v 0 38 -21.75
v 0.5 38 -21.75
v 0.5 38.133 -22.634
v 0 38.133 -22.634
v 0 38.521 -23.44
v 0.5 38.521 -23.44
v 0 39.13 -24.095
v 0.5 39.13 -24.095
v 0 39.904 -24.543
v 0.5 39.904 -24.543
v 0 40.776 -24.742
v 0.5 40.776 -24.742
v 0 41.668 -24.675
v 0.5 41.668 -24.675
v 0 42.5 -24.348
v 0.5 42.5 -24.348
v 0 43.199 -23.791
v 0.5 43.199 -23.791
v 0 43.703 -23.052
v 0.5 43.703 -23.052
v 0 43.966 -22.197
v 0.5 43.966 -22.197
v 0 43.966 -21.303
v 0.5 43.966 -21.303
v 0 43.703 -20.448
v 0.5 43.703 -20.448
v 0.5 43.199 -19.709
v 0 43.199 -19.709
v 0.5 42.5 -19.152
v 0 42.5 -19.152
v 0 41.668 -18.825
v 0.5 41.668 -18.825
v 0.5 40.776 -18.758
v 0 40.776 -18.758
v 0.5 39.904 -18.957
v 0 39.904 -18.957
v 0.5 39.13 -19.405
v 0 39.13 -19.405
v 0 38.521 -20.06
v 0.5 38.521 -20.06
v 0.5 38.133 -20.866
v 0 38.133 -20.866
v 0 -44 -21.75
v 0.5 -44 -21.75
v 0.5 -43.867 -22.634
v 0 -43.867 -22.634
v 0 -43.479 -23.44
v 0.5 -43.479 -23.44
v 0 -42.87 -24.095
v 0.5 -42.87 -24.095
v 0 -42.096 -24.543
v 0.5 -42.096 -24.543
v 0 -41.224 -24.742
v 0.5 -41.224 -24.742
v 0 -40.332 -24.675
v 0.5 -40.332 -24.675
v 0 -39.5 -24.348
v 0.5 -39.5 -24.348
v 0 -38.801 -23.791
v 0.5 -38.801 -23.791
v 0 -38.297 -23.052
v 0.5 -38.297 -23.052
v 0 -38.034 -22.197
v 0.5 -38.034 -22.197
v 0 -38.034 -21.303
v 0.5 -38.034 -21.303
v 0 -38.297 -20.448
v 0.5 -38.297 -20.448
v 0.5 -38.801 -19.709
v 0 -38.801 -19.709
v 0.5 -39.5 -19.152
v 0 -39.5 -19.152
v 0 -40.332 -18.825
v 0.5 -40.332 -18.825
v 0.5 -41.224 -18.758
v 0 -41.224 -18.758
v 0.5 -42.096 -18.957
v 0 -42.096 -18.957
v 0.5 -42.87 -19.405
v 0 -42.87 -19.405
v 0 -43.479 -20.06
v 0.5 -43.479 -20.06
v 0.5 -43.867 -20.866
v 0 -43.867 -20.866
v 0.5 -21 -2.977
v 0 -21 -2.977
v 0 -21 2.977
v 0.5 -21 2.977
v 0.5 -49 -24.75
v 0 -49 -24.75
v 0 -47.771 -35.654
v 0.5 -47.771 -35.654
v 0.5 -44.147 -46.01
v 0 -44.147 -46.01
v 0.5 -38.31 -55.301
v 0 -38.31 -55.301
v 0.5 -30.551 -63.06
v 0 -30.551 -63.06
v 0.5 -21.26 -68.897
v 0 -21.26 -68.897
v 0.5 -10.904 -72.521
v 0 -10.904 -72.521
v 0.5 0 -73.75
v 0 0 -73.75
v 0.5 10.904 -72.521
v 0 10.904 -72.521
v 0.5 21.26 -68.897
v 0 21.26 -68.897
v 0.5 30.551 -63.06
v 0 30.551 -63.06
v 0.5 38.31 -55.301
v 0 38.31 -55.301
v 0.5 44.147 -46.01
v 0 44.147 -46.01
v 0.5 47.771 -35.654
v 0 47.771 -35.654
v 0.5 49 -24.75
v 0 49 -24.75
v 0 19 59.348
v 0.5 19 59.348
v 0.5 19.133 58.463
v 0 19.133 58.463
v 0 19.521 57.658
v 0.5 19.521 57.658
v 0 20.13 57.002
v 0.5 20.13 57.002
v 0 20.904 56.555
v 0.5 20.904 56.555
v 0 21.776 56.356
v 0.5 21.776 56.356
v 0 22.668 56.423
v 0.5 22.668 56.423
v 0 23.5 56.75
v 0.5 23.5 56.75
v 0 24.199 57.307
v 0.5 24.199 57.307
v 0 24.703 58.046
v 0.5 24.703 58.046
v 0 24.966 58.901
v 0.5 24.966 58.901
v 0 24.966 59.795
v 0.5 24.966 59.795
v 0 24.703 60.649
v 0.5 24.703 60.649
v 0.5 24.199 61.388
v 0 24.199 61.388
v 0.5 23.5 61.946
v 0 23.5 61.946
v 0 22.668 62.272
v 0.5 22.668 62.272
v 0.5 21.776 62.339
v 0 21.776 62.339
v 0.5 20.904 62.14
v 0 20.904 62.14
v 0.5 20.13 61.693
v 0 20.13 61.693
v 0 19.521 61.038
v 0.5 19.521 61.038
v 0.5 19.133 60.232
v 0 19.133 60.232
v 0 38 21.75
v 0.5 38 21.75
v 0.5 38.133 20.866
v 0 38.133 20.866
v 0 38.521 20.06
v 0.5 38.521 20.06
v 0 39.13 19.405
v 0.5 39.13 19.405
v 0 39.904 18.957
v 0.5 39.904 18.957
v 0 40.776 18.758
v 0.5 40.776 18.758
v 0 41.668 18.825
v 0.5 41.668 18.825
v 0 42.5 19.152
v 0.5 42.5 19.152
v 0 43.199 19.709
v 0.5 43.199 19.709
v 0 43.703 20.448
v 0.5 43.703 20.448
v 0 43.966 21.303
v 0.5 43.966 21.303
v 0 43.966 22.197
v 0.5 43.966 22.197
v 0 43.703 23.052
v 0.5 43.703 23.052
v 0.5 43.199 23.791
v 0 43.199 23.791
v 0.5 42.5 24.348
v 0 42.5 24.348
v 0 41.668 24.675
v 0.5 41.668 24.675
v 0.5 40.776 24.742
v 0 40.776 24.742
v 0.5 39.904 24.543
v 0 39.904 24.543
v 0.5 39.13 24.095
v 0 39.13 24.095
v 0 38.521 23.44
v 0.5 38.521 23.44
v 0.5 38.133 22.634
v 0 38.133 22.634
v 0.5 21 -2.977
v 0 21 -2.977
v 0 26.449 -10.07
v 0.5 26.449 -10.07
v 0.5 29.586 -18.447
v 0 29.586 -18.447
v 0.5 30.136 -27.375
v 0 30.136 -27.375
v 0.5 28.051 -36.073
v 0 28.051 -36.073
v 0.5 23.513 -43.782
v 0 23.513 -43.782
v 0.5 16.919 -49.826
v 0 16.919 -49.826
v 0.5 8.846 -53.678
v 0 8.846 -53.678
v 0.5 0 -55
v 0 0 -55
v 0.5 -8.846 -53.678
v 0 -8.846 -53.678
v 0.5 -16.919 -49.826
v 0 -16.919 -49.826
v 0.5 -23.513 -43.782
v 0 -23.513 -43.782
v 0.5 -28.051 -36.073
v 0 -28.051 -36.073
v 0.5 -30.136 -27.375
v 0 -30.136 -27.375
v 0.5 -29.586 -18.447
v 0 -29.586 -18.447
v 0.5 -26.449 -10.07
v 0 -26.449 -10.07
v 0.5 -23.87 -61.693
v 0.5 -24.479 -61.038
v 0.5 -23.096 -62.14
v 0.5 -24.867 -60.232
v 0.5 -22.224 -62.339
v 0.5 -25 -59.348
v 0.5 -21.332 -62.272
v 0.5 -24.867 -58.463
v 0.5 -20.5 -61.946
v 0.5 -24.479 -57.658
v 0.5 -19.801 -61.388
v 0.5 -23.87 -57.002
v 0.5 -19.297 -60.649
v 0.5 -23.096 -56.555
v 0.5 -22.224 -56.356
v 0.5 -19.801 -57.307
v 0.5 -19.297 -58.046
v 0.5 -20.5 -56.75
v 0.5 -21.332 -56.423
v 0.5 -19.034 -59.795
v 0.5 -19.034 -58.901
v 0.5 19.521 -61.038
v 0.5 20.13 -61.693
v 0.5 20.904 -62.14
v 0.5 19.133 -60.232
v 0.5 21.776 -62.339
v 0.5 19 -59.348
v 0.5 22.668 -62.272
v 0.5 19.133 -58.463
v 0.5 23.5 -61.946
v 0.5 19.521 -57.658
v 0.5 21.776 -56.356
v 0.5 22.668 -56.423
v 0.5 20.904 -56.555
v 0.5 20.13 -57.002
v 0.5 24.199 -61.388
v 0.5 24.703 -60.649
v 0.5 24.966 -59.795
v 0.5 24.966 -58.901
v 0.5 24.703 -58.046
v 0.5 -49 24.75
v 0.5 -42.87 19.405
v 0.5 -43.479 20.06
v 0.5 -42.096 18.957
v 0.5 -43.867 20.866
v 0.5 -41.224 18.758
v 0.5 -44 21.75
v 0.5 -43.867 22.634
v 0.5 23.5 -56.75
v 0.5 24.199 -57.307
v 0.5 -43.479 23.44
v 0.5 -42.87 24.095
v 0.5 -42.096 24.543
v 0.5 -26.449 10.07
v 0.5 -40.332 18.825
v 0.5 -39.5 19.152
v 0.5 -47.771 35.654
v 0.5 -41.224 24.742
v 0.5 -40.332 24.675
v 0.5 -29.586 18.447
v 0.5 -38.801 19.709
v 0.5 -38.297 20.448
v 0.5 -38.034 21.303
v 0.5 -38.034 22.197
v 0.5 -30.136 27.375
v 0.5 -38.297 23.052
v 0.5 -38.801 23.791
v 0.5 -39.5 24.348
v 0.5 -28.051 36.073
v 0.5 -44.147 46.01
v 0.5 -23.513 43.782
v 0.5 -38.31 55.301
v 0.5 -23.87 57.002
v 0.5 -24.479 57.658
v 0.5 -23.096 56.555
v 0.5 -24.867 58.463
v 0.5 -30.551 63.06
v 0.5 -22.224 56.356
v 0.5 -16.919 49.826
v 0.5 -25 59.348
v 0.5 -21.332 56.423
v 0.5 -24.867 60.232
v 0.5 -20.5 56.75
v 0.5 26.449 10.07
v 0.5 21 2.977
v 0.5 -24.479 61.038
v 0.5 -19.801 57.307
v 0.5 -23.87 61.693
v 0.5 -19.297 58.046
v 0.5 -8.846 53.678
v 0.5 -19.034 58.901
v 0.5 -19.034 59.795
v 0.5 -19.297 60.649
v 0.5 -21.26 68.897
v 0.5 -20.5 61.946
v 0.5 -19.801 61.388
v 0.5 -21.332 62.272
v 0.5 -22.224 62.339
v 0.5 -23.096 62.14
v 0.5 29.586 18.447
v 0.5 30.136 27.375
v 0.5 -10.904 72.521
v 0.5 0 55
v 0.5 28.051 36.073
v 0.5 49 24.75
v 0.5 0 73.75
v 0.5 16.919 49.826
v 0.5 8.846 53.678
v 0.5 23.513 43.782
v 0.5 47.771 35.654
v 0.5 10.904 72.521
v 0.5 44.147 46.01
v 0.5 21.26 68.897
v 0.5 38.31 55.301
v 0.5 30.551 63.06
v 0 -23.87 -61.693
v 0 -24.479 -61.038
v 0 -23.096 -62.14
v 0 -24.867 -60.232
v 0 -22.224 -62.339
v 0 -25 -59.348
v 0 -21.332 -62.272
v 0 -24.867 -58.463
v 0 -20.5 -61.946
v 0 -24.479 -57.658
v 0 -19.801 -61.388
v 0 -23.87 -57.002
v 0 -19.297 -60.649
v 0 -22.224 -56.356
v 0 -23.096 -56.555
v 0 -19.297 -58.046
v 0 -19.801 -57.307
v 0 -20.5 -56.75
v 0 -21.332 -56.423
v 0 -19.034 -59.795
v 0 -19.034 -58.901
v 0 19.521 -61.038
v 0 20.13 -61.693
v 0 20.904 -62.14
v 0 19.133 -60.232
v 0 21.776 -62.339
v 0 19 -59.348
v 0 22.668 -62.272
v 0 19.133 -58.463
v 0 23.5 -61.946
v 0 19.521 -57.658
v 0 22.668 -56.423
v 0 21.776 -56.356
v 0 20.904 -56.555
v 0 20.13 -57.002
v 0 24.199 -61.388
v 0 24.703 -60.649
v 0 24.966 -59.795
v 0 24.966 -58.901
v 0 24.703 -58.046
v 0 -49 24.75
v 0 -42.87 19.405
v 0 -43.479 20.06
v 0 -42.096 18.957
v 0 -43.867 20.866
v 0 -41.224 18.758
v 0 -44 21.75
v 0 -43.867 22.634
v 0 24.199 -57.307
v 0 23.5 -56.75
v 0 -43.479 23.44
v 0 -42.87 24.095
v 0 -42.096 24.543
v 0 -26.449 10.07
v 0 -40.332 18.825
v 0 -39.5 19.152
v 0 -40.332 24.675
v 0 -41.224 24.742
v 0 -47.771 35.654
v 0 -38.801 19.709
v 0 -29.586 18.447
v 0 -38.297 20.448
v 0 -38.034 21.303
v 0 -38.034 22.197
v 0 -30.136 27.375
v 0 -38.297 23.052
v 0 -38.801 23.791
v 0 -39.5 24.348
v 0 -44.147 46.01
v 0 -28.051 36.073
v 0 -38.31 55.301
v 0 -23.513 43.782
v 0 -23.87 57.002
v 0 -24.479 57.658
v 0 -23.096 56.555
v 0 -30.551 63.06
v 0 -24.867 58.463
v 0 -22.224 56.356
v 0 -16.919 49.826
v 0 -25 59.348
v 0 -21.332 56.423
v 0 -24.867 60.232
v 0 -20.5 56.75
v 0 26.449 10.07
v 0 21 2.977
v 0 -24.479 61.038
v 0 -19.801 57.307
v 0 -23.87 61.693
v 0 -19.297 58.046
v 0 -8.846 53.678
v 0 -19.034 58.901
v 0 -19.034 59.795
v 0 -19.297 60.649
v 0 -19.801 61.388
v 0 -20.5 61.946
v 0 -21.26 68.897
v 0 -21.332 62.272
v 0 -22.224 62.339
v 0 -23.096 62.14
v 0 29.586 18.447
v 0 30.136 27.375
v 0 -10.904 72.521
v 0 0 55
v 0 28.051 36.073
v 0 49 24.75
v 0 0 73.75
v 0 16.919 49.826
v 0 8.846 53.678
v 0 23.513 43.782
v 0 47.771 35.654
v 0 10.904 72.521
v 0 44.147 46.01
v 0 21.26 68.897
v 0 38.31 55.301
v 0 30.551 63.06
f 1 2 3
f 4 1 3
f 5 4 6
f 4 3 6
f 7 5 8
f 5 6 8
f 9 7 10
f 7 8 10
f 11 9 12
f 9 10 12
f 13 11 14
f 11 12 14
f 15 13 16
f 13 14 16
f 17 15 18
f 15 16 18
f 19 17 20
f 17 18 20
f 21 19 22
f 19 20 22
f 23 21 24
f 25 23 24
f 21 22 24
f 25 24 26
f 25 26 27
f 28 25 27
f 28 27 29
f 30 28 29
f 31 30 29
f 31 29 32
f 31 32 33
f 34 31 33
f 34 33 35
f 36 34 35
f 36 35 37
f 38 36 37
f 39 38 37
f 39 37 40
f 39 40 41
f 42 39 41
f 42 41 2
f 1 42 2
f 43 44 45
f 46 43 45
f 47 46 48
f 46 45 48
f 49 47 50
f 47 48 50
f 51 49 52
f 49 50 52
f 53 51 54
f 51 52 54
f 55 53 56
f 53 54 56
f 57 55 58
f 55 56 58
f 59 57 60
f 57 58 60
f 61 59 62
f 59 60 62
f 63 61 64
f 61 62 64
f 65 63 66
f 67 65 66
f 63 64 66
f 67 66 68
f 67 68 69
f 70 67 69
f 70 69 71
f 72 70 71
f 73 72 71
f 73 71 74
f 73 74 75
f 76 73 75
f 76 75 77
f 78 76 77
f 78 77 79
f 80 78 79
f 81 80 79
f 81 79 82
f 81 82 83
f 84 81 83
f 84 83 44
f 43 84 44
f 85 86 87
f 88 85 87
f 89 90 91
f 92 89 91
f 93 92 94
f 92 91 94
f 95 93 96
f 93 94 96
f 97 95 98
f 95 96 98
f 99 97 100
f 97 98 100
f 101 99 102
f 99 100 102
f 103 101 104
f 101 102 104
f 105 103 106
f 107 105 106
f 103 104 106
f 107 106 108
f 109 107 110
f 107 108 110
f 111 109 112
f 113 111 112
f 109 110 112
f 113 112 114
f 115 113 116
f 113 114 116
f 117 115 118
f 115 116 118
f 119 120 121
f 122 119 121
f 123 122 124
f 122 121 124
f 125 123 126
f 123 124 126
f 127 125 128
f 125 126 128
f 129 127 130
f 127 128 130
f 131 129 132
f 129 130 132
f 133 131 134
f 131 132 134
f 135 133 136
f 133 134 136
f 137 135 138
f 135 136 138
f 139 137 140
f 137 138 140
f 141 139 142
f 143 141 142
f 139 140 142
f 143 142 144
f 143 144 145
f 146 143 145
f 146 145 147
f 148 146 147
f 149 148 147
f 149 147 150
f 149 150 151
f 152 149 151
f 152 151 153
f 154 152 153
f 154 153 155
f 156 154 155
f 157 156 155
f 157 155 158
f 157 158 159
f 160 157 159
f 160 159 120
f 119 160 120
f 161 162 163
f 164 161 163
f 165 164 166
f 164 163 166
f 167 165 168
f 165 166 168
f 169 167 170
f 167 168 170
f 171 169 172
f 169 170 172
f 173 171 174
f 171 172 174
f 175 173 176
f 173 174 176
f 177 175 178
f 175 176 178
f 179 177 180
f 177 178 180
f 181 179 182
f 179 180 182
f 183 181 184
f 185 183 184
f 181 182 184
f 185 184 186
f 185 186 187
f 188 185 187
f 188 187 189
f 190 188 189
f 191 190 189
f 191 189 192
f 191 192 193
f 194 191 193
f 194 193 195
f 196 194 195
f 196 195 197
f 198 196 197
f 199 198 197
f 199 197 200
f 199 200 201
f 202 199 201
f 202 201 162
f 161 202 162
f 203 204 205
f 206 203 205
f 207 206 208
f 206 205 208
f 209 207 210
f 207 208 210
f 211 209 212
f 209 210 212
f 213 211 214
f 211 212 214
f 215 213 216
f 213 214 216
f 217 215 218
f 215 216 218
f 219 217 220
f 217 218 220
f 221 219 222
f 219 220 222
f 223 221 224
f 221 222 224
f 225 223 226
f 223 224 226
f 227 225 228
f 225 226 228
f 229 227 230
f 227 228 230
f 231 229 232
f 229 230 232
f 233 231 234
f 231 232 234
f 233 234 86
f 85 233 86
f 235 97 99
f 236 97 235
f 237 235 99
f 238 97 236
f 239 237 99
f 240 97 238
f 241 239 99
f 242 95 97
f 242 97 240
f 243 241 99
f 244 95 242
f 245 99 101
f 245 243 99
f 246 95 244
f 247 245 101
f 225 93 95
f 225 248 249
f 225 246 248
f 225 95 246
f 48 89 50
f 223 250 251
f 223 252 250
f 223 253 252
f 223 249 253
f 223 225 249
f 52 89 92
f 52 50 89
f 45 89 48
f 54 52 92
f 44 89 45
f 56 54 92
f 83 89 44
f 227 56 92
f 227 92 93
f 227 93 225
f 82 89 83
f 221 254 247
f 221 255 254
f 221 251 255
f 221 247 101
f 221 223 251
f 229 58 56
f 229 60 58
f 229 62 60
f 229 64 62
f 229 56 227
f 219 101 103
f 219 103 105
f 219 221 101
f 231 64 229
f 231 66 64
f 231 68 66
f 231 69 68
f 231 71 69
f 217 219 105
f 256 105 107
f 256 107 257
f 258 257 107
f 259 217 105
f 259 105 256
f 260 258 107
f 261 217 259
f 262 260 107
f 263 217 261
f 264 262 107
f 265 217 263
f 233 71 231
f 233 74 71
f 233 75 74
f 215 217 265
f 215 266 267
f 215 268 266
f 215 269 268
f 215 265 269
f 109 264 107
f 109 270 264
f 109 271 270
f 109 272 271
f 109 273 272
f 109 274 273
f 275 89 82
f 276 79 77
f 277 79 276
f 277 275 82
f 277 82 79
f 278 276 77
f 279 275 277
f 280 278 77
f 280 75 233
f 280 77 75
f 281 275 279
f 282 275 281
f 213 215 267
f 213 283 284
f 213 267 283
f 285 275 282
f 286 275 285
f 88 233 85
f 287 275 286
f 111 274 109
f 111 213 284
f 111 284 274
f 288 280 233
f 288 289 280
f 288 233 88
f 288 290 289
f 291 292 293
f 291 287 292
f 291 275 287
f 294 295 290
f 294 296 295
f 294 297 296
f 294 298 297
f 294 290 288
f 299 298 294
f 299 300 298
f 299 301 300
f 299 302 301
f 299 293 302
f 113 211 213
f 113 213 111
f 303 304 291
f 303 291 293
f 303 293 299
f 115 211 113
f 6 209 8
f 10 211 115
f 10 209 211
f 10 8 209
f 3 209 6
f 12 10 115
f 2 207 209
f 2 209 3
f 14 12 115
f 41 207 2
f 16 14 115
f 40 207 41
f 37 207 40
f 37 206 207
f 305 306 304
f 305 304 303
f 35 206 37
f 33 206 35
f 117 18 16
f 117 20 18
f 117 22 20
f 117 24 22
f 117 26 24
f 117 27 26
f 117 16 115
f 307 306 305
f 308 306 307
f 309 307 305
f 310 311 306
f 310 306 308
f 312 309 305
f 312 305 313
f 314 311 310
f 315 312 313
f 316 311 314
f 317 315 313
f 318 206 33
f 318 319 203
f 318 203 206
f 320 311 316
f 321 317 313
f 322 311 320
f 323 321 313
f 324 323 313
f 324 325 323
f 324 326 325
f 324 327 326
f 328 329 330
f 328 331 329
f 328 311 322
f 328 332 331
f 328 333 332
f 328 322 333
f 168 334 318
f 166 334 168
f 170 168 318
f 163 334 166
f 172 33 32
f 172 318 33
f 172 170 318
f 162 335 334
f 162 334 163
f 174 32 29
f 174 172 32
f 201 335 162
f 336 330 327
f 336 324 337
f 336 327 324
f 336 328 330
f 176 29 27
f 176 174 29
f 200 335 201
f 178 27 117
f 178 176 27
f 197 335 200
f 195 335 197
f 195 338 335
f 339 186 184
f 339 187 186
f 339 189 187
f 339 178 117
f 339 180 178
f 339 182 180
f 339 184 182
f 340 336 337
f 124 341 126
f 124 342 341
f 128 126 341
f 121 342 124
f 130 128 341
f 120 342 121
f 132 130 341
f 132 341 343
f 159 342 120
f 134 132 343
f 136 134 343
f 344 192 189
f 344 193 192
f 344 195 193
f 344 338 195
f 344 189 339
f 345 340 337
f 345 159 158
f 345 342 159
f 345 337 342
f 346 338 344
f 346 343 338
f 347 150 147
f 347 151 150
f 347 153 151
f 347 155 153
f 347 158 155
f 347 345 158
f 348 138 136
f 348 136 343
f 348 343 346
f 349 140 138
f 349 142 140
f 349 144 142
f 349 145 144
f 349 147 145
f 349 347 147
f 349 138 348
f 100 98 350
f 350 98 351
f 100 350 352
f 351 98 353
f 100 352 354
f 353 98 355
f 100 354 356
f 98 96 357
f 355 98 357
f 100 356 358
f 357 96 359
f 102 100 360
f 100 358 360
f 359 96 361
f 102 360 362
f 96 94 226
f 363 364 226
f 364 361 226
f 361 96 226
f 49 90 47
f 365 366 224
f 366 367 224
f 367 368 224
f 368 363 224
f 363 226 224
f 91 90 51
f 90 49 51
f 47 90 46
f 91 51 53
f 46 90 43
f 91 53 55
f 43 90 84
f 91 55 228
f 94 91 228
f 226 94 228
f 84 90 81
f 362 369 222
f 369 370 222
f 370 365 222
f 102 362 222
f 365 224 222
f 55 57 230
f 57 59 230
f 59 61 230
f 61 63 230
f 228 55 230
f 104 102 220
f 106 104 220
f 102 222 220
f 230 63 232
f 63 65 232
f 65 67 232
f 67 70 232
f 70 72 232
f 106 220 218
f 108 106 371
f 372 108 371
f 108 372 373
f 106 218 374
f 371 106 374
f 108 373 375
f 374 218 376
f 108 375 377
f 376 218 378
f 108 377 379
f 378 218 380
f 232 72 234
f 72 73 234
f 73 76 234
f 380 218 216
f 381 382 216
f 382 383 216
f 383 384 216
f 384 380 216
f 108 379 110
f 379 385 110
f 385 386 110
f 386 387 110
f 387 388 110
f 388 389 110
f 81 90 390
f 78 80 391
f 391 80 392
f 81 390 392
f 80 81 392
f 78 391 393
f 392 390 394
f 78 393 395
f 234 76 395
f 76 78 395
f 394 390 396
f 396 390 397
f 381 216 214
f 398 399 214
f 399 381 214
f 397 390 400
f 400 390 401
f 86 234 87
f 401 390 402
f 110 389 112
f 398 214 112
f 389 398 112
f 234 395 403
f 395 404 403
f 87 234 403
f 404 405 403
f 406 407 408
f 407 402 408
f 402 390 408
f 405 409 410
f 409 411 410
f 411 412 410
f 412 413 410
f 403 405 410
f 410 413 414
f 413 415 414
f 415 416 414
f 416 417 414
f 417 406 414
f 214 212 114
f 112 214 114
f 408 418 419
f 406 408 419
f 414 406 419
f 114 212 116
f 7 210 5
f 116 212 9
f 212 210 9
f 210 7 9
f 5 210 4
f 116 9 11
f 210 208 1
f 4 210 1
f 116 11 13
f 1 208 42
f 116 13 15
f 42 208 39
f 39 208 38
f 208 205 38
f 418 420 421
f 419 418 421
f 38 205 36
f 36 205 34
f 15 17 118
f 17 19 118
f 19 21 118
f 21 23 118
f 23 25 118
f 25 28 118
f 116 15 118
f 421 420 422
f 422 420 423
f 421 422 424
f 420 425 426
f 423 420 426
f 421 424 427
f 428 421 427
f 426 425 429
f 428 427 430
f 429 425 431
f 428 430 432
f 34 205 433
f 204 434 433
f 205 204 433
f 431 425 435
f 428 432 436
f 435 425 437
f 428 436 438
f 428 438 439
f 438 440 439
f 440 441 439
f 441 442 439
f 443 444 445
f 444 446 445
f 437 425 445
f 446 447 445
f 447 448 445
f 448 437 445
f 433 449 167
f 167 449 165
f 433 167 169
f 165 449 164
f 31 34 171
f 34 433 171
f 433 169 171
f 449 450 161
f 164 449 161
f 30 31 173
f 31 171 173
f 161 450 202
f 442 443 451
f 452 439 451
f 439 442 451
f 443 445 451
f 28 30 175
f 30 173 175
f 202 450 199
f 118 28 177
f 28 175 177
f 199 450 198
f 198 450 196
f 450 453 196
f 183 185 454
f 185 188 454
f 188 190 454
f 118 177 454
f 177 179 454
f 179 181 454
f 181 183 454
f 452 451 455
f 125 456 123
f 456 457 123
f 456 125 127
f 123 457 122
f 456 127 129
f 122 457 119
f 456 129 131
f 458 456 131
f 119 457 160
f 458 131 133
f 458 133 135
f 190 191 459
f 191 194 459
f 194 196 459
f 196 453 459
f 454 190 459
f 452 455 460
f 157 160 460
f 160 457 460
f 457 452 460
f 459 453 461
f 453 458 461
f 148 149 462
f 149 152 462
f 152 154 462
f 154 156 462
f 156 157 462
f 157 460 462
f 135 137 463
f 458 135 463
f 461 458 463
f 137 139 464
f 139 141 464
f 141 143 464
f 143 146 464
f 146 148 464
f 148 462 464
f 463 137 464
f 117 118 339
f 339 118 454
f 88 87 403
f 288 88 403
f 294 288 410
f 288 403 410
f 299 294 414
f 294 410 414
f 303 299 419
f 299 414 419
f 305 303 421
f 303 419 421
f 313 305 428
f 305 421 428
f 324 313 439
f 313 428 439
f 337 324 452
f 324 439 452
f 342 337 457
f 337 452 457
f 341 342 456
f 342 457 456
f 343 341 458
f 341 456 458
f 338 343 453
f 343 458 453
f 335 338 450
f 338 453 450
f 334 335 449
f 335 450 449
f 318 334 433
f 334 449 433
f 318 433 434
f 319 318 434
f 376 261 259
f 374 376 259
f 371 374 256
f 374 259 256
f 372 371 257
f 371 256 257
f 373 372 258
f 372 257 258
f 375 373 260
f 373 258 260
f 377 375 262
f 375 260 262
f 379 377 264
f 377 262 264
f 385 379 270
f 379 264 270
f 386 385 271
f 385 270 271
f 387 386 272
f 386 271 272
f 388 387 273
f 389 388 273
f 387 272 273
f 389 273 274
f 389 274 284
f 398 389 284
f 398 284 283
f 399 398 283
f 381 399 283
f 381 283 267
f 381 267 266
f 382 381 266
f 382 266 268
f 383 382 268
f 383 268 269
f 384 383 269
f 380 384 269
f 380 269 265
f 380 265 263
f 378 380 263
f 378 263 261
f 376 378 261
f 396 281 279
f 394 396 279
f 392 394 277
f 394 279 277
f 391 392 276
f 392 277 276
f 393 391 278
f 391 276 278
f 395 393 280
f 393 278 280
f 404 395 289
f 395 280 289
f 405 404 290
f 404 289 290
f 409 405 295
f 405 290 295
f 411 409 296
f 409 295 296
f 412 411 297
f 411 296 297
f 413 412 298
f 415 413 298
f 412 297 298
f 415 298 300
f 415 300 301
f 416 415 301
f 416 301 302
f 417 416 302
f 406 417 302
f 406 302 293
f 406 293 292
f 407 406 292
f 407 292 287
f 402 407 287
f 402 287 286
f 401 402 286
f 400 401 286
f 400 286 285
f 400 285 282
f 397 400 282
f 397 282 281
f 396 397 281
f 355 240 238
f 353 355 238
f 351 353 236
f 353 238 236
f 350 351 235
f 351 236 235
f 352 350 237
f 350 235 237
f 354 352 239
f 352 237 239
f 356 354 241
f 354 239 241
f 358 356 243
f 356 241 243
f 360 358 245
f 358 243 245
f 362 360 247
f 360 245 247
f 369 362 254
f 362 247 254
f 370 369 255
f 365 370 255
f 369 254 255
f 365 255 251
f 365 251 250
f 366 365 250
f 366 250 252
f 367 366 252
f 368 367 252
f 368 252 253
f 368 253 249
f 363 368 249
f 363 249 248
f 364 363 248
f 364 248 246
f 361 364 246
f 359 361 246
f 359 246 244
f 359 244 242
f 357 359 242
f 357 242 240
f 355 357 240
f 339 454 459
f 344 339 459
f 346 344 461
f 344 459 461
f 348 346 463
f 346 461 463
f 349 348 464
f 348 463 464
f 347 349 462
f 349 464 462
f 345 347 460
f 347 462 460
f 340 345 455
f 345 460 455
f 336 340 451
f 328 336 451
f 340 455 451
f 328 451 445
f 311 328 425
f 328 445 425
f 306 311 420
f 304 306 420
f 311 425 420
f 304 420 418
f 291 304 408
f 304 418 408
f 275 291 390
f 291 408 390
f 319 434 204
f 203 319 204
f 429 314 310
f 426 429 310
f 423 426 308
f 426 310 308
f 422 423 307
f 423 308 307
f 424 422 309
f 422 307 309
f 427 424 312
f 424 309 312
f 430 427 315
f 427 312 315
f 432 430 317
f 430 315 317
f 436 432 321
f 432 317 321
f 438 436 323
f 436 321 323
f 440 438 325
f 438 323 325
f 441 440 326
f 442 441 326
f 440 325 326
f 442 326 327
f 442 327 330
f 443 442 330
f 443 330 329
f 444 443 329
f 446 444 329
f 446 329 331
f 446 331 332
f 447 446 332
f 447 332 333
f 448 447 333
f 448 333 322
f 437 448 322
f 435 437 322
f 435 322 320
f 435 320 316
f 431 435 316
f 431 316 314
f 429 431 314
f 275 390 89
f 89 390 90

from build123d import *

# Parameters (mm, degrees)
F1_DEPTH = 0.5
F2_D     = 6


with BuildPart() as f1:
    # F0 (on Right) → F1 (new body)
    with BuildSketch(Plane.YZ):
        with BuildLine():
            Line((49, -24.75), (49, 24.75))
            ThreePointArc((49, 24.75), (0, 73.75), (-49, 24.75))
            Line((-49, 24.75), (-49, -24.75))
            ThreePointArc((-49, -24.75), (0, -73.75), (49, -24.75))
        make_face()
        with BuildLine():
            ThreePointArc((-21, 2.977024), (0, 55), (21, 2.977024))
            Line((21, 2.977024), (21, -2.977024))
            ThreePointArc((21, -2.977024), (0, -55), (-21, -2.977024))
            Line((-21, -2.977024), (-21, 2.977024))
        make_face(mode=Mode.SUBTRACT)
    extrude(amount=F1_DEPTH)

    # F2 (through all)
    with Locations(Plane(origin=(0, 0, 0), x_dir=(0, 1, 0), z_dir=(-1, 0, 0))):
        with Locations((22, 59.347688), (-22, 59.347688), (-41, 21.75), (-41, -21.75), (-22, -59.347688), (22, -59.347688), (41, -21.75), (41, 21.75)):
            Hole(F2_D / 2)


solid = f1.part
